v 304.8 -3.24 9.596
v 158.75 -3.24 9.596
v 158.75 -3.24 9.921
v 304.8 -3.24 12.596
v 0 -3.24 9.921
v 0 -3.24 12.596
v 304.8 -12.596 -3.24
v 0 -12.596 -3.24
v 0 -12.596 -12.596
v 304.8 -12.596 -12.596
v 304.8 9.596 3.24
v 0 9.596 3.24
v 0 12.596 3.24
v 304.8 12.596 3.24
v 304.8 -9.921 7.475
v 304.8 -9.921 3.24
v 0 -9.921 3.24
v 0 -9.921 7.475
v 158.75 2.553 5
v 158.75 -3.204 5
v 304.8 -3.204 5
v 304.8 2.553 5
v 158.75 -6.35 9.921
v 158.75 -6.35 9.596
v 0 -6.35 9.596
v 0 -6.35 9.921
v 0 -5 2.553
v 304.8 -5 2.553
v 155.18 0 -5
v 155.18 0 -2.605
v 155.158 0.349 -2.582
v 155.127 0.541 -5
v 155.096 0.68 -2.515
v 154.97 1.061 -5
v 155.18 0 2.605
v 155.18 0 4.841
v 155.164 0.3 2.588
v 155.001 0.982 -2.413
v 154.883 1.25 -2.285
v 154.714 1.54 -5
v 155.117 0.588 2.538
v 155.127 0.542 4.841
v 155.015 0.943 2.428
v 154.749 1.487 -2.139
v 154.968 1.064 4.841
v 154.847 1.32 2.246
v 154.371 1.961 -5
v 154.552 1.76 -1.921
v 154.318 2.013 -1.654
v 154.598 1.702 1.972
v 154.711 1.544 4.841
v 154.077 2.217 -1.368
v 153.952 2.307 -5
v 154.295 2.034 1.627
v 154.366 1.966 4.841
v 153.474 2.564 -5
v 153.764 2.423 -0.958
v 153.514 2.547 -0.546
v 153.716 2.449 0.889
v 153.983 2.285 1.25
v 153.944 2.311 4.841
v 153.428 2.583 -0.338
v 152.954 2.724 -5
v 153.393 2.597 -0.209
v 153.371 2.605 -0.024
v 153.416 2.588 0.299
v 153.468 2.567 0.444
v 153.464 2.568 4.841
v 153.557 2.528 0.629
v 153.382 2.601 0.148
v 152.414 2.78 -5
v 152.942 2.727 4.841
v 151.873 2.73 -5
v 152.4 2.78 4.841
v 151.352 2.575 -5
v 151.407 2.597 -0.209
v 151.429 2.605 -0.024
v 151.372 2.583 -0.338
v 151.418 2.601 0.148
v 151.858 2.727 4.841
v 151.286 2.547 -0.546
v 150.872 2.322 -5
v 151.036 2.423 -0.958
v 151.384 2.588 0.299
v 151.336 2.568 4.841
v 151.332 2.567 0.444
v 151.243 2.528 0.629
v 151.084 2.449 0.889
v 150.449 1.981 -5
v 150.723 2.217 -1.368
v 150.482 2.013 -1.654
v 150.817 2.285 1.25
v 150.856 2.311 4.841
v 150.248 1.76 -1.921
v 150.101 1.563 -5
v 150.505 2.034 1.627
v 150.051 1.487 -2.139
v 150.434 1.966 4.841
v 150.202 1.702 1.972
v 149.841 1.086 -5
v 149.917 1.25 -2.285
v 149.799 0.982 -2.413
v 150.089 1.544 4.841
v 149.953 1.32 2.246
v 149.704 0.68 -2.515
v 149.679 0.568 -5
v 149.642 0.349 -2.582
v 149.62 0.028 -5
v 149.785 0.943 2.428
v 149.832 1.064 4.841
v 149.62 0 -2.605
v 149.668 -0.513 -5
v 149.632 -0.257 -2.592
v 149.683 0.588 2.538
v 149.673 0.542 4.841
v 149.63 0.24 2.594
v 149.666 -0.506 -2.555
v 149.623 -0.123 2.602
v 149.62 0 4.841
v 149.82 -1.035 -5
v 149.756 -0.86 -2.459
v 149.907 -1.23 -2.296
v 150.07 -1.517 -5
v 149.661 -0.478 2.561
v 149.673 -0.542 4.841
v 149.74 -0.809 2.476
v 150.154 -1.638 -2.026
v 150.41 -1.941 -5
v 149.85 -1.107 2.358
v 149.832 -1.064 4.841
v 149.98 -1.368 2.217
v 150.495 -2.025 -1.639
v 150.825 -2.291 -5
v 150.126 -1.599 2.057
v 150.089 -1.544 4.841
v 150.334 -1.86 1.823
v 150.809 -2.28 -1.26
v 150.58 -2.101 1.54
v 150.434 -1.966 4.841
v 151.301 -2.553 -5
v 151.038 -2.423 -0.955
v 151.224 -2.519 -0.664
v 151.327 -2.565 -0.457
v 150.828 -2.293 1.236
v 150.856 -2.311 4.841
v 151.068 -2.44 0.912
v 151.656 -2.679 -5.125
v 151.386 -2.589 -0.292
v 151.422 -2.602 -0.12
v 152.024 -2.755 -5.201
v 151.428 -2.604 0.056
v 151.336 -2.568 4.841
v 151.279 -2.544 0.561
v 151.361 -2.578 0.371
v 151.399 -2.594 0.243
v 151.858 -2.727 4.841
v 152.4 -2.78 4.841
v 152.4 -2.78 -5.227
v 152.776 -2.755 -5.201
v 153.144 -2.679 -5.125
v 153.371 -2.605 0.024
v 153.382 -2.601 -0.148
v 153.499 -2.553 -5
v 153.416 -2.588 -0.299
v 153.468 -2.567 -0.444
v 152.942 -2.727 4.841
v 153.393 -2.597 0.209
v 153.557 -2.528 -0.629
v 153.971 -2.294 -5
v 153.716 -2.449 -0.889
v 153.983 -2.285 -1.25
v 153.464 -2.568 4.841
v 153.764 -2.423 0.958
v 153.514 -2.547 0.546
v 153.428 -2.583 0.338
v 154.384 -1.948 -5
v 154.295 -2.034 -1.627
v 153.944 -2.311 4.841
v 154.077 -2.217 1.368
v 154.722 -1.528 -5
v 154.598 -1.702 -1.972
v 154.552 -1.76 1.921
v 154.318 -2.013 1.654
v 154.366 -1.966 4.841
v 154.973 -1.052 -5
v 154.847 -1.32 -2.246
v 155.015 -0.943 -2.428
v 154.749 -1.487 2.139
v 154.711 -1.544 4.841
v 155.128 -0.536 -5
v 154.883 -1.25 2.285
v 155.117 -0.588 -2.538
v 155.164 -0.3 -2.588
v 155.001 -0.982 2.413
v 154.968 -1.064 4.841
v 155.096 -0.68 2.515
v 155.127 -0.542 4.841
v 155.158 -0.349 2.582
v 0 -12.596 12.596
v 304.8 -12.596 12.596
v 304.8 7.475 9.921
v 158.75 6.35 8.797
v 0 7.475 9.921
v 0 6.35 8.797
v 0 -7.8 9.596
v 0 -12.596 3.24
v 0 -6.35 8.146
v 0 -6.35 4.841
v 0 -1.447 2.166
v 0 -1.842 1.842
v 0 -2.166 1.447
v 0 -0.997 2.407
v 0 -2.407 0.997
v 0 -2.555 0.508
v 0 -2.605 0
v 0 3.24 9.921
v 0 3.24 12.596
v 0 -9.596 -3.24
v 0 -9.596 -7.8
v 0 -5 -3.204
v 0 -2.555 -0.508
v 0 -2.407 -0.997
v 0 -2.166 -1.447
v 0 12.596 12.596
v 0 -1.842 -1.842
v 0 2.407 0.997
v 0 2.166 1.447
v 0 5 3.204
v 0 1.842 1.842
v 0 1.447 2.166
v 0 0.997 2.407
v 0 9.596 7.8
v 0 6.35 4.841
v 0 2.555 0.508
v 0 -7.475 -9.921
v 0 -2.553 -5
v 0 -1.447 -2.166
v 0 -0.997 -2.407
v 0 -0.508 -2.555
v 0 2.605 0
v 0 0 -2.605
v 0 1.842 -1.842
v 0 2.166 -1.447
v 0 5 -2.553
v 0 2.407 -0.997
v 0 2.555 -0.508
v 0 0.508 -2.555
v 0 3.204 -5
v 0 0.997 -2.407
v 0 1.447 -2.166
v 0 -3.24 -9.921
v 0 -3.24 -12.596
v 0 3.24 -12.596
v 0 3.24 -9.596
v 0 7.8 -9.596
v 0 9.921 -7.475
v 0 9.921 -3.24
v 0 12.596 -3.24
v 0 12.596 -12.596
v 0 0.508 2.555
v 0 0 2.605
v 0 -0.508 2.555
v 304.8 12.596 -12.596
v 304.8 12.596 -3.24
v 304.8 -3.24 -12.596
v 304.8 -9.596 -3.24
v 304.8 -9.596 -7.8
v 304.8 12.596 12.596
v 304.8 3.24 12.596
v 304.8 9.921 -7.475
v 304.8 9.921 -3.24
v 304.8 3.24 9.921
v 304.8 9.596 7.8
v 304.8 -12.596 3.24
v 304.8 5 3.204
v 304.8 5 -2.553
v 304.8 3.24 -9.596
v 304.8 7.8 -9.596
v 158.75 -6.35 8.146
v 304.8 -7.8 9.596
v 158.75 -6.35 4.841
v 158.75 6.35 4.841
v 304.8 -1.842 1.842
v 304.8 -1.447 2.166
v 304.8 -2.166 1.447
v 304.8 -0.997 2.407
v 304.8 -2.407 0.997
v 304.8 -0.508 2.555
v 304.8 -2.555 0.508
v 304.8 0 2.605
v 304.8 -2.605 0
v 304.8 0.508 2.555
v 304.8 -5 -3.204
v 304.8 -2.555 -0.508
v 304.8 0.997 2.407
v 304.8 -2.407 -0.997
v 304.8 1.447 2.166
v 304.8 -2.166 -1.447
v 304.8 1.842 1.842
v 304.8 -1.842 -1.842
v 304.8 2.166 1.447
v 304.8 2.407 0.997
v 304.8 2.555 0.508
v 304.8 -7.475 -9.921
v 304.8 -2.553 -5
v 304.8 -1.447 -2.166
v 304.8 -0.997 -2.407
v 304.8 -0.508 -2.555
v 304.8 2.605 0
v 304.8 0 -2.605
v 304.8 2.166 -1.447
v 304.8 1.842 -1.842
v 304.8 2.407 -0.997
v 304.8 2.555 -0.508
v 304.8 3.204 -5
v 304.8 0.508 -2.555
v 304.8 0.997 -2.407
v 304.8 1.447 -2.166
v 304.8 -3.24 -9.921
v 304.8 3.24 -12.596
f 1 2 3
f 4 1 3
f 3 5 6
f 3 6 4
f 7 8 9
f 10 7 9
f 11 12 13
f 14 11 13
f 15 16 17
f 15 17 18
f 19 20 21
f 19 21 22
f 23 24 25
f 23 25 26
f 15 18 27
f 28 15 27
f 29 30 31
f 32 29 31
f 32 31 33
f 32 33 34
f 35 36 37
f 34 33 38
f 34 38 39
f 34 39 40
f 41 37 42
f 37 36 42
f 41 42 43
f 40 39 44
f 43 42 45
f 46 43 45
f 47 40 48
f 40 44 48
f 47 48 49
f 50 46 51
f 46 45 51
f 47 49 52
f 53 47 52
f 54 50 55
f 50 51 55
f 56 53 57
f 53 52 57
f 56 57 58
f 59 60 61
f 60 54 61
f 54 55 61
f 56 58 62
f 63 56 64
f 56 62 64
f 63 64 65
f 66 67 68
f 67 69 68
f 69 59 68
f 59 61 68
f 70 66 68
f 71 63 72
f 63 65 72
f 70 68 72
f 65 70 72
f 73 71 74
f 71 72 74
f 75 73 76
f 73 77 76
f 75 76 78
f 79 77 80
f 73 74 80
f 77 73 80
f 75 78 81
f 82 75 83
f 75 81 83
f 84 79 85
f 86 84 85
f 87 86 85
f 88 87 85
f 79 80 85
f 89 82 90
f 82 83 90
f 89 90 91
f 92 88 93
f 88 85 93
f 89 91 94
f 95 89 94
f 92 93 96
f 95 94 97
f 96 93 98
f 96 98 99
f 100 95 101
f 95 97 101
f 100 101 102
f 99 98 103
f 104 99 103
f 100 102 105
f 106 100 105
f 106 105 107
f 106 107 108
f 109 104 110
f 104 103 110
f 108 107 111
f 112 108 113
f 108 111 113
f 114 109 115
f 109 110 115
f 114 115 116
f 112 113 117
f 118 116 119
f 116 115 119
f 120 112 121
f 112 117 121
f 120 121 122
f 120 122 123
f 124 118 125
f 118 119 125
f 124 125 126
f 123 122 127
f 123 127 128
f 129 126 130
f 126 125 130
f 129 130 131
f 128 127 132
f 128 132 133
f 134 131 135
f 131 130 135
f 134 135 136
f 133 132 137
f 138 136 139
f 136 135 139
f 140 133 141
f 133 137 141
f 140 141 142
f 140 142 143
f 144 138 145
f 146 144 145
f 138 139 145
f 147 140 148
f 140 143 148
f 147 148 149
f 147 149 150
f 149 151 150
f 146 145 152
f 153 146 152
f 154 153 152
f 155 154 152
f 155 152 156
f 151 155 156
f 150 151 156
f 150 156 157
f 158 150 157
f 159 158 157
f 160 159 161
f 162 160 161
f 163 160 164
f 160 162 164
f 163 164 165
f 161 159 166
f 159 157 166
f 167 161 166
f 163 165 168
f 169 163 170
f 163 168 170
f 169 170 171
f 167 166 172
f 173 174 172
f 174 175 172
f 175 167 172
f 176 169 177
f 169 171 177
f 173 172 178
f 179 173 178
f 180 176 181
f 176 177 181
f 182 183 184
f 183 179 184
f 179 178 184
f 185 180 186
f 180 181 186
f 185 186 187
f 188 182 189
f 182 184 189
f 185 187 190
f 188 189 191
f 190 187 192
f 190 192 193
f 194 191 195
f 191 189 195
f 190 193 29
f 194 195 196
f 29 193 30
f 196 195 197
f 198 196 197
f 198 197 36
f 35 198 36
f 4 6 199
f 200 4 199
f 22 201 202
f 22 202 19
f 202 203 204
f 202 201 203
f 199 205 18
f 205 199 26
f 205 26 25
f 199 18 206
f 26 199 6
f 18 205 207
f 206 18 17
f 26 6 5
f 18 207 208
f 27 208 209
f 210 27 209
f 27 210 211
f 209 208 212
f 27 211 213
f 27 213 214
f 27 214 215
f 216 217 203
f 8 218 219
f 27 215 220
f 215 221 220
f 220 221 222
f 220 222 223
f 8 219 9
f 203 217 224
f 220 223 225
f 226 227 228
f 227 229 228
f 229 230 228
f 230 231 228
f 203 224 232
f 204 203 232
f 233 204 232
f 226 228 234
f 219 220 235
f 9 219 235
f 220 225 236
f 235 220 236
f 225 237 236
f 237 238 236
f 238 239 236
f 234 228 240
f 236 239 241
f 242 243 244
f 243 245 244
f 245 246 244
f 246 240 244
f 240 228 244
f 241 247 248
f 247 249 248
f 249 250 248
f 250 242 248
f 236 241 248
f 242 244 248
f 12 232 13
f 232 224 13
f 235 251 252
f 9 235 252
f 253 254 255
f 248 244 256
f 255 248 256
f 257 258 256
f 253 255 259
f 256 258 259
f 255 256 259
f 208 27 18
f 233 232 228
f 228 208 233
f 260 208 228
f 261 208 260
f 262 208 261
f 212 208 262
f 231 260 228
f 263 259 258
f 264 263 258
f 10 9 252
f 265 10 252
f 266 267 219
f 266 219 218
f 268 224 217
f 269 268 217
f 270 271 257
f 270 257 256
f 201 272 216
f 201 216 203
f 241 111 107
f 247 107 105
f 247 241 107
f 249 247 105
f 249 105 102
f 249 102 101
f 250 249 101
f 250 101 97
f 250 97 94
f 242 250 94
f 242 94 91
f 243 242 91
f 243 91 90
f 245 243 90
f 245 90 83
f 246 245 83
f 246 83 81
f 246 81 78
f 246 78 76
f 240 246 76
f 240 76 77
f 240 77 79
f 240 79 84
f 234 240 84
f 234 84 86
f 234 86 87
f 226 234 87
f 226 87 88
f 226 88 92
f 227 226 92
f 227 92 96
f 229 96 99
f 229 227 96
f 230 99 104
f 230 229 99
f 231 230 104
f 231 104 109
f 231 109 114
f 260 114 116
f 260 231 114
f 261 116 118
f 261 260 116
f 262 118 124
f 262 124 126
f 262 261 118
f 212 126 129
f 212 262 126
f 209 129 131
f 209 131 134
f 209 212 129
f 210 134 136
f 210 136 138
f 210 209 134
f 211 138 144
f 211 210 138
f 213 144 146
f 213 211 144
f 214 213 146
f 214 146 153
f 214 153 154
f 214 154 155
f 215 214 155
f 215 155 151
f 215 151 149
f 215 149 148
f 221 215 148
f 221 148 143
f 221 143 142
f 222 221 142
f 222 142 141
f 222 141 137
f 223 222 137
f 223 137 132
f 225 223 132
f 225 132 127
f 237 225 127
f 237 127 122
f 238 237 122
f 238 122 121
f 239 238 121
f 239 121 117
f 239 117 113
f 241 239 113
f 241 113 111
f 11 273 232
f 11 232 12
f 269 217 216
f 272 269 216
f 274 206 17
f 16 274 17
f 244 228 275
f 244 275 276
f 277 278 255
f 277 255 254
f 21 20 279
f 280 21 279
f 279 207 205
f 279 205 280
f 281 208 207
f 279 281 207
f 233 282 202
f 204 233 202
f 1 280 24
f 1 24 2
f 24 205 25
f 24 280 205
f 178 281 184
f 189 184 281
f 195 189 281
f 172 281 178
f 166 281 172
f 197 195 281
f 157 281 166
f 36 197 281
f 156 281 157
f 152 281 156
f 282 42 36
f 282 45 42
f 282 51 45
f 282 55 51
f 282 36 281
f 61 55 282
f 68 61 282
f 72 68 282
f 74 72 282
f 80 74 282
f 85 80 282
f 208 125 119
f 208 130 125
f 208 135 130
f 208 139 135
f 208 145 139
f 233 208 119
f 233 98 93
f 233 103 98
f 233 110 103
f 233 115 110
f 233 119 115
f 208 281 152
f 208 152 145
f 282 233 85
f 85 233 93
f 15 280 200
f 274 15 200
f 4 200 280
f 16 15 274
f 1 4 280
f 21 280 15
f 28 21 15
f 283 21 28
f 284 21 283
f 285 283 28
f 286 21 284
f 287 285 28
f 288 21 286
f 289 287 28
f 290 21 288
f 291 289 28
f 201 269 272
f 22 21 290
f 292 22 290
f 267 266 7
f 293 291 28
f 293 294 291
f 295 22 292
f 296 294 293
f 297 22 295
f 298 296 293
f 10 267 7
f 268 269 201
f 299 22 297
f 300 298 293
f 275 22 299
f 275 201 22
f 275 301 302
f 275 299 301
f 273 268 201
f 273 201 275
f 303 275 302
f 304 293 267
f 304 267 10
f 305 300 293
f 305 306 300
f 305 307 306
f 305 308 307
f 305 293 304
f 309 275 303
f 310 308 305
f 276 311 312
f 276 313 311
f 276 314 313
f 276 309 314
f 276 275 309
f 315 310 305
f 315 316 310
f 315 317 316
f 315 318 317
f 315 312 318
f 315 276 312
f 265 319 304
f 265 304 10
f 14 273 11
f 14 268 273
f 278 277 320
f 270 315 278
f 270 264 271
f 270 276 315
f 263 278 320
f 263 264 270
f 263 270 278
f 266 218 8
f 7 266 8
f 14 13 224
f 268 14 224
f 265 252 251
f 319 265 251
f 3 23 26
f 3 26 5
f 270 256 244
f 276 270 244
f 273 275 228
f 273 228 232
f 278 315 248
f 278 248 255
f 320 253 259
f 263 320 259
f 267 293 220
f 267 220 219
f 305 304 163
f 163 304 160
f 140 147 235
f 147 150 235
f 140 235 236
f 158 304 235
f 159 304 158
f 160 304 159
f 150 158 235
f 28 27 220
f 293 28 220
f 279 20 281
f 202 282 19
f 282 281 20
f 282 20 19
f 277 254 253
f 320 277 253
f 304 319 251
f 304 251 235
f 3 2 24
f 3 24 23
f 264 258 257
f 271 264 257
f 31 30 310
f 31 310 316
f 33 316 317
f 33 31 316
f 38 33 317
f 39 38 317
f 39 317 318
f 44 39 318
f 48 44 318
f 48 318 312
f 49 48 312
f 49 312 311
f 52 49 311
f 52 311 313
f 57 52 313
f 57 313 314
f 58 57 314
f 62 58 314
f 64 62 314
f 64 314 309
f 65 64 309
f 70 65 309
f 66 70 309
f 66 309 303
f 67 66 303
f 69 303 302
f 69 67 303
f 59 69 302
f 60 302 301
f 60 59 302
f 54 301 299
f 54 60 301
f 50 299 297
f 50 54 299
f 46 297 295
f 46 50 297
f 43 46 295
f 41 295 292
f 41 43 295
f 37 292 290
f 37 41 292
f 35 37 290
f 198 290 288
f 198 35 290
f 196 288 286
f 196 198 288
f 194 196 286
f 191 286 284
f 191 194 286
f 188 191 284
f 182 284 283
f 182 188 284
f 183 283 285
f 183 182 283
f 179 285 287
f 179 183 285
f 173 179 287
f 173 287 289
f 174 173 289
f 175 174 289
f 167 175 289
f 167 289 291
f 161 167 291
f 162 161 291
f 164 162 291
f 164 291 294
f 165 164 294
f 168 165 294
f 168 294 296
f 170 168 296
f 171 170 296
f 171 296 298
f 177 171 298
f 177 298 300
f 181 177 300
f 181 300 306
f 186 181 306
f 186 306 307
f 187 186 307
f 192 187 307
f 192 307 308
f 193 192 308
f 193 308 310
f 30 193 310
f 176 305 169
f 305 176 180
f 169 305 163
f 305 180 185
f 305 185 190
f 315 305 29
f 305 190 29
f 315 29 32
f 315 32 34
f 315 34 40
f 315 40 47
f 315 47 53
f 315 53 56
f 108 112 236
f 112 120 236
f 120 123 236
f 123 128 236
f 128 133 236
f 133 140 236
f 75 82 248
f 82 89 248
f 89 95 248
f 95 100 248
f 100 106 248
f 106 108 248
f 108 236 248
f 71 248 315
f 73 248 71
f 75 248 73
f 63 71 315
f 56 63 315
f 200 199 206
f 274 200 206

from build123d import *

# Parameters (mm, degrees)
SKETCH1_R           = 2.605
BOSS_EXTRUDE1_DEPTH = 304.8
CIRPATTERN1_COUNT   = 4
SKETCH2_R           = 2.78
CUT_EXTRUDE1_DEPTH  = 30
SKETCH3_W           = 5.08
SKETCH3_H           = 12.7
CUT_EXTRUDE2_DEPTH  = 158.75


with BuildPart() as part:
    # Sketch1 → Boss-Extrude1 (new body)
    with BuildSketch(Plane(origin=(0, 0, 0), x_dir=(0, 0, -1), z_dir=(1, 0, 0))):
        Polygon((5, -5), (5, 3.203948776), (9.596194078, 7.800142853), (9.596194078, 3.24), (12.596194078, 3.24), (12.596194078, 12.596194078), (3.24, 12.596194078), (3.24, 9.921463197), (7.474873734, 9.921463197), (2.553410537, 5), (-5, 5), (-5, -5), align=None)
        Circle(SKETCH1_R, mode=Mode.SUBTRACT)
    boss_extrude1 = extrude(amount=BOSS_EXTRUDE1_DEPTH)

    # CirPattern1: Boss-Extrude1 ×4 about axis
    cirpattern1_axis = Axis((0, 0, 0), (1, 0, 0))
    for i in range(1, CIRPATTERN1_COUNT):
        add(boss_extrude1.rotate(cirpattern1_axis, i * 360 / CIRPATTERN1_COUNT))

    # Sketch2 → Cut-Extrude1 (cut)
    with BuildSketch(Plane.XY.offset(12.596194078)):
        with Locations((152.4, 0)):
            Circle(SKETCH2_R)
    extrude(amount=-CUT_EXTRUDE1_DEPTH, mode=Mode.SUBTRACT)

    # Sketch3 → Cut-Extrude2 (cut)
    with BuildSketch(Plane.ZY):
        with Locations((7.381463197, 0)):
            Rectangle(SKETCH3_W, SKETCH3_H)
    extrude(amount=-CUT_EXTRUDE2_DEPTH, mode=Mode.SUBTRACT)


solid = part.part
